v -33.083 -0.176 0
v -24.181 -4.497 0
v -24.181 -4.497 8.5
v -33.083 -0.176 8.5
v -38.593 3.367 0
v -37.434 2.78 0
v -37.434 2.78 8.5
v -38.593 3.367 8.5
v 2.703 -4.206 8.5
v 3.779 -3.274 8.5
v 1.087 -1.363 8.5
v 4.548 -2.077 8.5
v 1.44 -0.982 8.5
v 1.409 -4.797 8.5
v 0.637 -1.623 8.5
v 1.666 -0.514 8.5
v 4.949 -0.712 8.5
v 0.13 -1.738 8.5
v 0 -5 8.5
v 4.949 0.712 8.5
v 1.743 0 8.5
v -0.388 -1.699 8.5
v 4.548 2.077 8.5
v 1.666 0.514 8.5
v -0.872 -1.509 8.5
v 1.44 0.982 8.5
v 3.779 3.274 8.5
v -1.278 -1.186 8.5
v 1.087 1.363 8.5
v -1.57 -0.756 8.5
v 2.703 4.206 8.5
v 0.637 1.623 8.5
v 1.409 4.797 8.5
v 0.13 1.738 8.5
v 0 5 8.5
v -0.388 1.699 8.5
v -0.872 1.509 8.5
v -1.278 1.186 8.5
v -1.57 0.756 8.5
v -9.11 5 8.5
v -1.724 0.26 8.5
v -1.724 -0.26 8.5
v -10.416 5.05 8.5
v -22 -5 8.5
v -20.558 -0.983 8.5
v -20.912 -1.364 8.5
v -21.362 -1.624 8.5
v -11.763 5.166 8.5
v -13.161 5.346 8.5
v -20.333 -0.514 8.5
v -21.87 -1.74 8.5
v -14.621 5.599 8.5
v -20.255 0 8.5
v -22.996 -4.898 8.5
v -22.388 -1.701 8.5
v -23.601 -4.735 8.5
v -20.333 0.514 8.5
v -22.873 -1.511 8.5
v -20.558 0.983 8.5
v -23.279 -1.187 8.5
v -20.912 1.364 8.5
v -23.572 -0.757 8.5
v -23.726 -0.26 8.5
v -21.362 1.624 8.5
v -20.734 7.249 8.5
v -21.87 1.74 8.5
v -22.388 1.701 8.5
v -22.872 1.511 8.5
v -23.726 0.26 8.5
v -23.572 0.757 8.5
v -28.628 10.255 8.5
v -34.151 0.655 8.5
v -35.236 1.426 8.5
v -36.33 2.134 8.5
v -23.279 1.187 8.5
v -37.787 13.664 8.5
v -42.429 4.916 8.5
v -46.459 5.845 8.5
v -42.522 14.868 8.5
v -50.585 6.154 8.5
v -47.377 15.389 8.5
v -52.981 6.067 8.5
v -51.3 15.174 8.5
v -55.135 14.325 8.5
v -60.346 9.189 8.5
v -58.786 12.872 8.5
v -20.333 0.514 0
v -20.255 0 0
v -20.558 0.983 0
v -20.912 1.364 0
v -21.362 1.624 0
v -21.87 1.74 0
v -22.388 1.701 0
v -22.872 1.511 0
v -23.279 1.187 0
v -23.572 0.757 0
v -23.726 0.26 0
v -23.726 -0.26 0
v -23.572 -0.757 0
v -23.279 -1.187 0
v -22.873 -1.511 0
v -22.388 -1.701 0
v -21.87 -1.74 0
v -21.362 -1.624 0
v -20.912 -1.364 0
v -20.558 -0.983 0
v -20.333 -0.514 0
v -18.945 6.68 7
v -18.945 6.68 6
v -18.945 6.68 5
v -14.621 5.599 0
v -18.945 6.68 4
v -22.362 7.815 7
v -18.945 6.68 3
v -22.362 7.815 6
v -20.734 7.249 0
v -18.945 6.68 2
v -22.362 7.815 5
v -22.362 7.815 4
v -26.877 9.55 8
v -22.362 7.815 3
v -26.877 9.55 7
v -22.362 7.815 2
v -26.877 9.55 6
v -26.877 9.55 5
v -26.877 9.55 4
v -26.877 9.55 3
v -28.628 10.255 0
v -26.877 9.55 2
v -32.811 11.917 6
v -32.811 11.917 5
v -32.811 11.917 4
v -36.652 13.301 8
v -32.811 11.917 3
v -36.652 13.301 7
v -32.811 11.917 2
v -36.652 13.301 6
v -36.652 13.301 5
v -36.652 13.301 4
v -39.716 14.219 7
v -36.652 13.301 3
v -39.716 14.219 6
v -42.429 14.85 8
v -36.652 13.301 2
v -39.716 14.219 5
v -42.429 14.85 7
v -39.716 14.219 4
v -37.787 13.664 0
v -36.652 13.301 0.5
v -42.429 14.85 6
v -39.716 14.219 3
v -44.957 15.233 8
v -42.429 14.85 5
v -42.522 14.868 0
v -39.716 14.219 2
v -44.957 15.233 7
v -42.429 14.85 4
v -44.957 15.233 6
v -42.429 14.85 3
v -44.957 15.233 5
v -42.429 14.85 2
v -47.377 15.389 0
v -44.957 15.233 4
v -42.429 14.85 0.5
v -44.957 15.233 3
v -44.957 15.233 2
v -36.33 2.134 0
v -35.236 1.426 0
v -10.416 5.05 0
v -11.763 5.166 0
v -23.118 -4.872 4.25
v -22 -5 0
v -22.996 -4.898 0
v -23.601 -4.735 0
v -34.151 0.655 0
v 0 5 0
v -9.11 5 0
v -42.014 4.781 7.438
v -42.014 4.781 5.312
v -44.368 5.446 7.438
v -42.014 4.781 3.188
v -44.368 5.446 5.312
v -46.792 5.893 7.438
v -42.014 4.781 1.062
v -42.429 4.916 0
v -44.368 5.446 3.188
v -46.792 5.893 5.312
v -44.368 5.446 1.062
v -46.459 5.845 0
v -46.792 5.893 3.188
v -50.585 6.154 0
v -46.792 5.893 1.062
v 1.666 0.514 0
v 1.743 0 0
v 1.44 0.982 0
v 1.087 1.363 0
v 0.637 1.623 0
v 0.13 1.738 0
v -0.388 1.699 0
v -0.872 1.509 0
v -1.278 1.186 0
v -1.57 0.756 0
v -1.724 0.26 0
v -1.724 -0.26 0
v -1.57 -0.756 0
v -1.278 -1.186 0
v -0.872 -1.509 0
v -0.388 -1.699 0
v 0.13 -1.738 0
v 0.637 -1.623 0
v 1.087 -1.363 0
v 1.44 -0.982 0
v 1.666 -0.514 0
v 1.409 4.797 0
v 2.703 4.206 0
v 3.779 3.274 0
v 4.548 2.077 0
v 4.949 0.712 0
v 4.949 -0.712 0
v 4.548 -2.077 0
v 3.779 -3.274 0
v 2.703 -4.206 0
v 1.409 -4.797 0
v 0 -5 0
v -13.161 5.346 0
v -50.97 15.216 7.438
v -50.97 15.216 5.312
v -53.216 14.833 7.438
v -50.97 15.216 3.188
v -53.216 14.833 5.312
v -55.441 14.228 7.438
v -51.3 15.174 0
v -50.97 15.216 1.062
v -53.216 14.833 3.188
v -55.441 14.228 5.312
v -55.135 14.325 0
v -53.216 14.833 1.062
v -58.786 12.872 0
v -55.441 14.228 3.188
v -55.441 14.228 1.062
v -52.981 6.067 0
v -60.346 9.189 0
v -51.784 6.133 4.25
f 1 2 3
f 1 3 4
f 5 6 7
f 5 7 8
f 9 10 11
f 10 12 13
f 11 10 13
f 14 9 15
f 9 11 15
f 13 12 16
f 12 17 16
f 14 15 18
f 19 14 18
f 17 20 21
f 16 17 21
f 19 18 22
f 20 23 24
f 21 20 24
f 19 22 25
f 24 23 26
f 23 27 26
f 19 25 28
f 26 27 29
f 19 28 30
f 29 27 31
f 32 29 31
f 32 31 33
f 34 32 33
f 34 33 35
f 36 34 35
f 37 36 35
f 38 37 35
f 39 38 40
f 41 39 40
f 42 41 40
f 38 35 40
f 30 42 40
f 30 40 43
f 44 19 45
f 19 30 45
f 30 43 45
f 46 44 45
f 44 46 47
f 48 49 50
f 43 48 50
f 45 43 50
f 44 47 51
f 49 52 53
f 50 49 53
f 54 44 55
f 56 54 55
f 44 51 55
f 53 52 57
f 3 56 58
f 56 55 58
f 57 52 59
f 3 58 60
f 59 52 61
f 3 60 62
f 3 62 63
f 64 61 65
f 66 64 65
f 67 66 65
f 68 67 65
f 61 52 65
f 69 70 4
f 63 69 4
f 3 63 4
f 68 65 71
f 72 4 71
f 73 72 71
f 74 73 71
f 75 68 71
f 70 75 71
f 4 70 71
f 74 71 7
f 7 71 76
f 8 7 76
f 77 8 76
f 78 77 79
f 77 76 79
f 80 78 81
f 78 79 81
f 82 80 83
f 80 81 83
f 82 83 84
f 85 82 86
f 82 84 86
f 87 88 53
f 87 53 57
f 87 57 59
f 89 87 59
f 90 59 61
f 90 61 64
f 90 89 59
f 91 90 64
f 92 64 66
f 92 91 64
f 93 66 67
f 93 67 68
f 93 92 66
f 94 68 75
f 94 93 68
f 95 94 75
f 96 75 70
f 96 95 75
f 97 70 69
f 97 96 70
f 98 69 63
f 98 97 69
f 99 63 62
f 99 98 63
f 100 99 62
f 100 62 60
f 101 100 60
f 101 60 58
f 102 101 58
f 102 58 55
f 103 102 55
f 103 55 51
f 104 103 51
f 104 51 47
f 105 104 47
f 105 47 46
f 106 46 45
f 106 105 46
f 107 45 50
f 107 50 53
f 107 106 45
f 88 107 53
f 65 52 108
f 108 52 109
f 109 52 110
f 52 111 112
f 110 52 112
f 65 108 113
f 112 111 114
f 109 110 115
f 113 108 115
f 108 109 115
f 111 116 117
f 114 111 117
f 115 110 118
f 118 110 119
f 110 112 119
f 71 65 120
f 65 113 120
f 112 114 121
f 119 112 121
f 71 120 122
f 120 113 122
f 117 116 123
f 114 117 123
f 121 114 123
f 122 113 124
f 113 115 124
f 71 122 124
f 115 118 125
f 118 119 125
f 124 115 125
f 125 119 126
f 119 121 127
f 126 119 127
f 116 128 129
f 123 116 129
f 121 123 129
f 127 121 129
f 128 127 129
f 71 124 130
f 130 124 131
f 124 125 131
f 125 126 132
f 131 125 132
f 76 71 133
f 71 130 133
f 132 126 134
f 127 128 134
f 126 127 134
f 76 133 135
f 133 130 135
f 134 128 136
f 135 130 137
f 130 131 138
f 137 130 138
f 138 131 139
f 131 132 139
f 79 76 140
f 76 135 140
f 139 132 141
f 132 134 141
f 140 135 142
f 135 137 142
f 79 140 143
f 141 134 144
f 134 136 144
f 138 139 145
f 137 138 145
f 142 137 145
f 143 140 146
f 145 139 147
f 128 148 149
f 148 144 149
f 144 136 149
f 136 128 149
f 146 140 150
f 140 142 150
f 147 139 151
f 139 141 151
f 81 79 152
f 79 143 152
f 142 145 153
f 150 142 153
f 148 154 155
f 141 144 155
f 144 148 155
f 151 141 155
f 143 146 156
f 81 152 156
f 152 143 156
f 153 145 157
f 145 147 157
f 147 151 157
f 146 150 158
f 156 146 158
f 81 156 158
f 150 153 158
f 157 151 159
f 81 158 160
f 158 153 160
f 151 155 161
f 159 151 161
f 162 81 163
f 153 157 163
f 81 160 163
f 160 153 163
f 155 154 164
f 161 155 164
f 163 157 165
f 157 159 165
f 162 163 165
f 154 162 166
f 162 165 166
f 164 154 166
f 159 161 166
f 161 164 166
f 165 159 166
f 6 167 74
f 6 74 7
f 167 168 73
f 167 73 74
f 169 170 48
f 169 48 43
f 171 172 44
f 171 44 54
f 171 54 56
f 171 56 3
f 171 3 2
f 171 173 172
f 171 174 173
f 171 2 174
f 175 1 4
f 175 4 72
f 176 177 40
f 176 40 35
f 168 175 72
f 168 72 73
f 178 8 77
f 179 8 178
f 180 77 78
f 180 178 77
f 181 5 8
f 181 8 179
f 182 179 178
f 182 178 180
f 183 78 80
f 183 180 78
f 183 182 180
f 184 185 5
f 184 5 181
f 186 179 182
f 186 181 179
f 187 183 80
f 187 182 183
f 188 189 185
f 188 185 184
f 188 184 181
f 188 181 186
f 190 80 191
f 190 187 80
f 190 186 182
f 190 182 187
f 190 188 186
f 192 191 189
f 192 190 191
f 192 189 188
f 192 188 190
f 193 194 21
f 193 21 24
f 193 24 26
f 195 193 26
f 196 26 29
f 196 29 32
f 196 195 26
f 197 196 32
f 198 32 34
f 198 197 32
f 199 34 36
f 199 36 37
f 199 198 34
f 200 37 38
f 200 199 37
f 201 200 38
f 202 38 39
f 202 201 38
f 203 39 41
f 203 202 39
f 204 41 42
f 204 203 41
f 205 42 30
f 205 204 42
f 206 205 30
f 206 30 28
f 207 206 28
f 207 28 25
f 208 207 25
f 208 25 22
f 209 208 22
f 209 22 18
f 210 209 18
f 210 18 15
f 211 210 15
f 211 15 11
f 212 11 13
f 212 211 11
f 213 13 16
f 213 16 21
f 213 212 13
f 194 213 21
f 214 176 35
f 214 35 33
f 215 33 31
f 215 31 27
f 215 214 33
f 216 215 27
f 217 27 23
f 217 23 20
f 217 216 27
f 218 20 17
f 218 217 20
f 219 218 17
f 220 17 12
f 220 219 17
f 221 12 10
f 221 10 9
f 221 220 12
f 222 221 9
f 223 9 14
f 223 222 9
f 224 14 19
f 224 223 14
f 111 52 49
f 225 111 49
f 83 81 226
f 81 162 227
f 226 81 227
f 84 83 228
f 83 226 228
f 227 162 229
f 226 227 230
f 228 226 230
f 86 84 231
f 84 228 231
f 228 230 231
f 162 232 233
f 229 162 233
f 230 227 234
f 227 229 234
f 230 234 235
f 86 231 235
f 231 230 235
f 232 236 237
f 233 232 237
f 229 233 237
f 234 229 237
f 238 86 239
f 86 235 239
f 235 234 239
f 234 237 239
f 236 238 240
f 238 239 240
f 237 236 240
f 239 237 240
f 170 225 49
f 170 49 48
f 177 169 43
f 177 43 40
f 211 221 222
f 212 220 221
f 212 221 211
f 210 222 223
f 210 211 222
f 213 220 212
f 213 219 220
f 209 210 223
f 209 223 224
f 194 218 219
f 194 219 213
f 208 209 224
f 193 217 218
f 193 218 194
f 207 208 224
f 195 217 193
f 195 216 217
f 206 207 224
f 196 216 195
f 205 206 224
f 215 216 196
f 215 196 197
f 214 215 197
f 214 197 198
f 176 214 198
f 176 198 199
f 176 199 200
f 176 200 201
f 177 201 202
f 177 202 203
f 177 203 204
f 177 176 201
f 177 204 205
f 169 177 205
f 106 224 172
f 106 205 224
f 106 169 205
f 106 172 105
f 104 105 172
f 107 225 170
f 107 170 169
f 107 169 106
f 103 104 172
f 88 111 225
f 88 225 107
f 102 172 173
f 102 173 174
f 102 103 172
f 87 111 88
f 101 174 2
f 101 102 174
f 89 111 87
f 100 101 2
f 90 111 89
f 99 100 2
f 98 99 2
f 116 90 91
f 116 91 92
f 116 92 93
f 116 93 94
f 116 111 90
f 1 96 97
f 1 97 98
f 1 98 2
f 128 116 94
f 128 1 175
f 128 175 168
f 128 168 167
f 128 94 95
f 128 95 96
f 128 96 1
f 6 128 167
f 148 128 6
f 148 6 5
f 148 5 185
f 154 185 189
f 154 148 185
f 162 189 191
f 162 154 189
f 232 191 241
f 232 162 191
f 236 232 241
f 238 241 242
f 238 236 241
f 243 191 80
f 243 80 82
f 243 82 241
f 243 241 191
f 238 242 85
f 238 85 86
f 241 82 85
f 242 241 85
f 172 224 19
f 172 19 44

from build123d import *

# Parameters (mm, degrees)
CROQUIS1_R              = 1.743
CROQUIS1_R_2            = 1.745
SALIENTE_EXTRUIR1_DEPTH = 8.5


with BuildPart() as part:
    # Croquis1 → Saliente-Extruir1 (new body)
    with BuildSketch(Plane.XY):
        with BuildLine():
            Line((-8.694, 5), (0, 5))
            ThreePointArc((0, 5), (5, 0), (0, -5))
            Line((0, -5), (-22, -5))
            add(Edge.make_bspline(
                [(-22, -5), (-22.376114087, -5.000730995), (-23.127936381, -4.912027071), (-23.842743751, -4.662668406), (-24.18108985, -4.497)],
                knots=[0, 0, 0, 0, 0.499595813, 1, 1, 1, 1], degree=3))
            Line((-24.18108985, -4.497), (-33.082774185, -0.176))
            Line((-33.082774185, -0.176), (-34.150774185, 0.655))
            Line((-34.150774185, 0.655), (-35.235774185, 1.426))
            Line((-35.235774185, 1.426), (-36.329774185, 2.134))
            Line((-36.329774185, 2.134), (-37.433774185, 2.78))
            Line((-37.433774185, 2.78), (-38.592774185, 3.367))
            add(Edge.make_bspline(
                [(-38.592774185, 3.367), (-39.332541124, 3.73458873), (-40.463584029, 4.233674803), (-42.009779682, 4.789621338), (-43.18029785, 5.1503195), (-44.367367964, 5.455509833), (-45.571550782, 5.707001476), (-46.794958977, 5.902822636), (-48.465017773, 6.09379478), (-49.733307298, 6.151003132), (-50.584774185, 6.154)],
                knots=[0, 0, 0, 0, 0.199499465, 0.298230174, 0.396705181, 0.49521602, 0.594152289, 0.693710503, 0.79435234, 1, 1, 1, 1], degree=3))
            add(Edge.make_bspline(
                [(-50.584774185, 6.154), (-51.784512946, 6.156123129), (-52.980774185, 6.067)],
                knots=[0, 0, 0, 1, 1, 1], degree=2))
            Line((-52.980774185, 6.067), (-60.345774185, 9.189))
            Line((-60.345774185, 9.189), (-58.785774185, 12.872))
            add(Edge.make_bspline(
                [(-47.376936723, 15.389), (-48.196892042, 15.403291142), (-49.398277121, 15.379717661), (-50.970775635, 15.224558885), (-52.098811061, 15.061295448), (-53.219989961, 14.84128524), (-54.336112455, 14.567008142), (-55.4494326, 14.235014339), (-56.95056509, 13.707761437), (-58.056017514, 13.22696924), (-58.785774185, 12.872)],
                knots=[0, 0, 0, 0, 0.208580678, 0.30512865, 0.401665607, 0.498317749, 0.595560953, 0.693826211, 0.793634588, 1, 1, 1, 1], degree=3))
            add(Edge.make_bspline(
                [(-14.621, 5.599), (-15.563222131, 5.781119084), (-17.011007703, 6.120848832), (-18.989445264, 6.684731463), (-20.635507849, 7.208092626), (-22.439927245, 7.83467175), (-24.540120329, 8.619913648), (-27.091397312, 9.631396334), (-29.90077475, 10.772491334), (-32.584990491, 11.839895748), (-34.794603661, 12.665403671), (-36.602182307, 13.292835375), (-38.193000796, 13.796531357), (-39.671884667, 14.211722291), (-41.068328907, 14.576337495), (-42.402463198, 14.85165039), (-43.69443221, 15.078308418), (-45.342048595, 15.292337563), (-46.568508645, 15.371828774), (-47.376936723, 15.389)],
                knots=[0, 0, 0, 0, 0.083834458, 0.129855591, 0.179713331, 0.234726598, 0.296726991, 0.375600314, 0.474504455, 0.561662864, 0.627975282, 0.680575135, 0.728822097, 0.773739203, 0.814774439, 0.854888969, 0.892720603, 0.929358167, 1, 1, 1, 1], degree=3))
            Line((-14.621, 5.599), (-13.161, 5.346))
            Line((-13.161, 5.346), (-11.763, 5.166))
            Line((-11.763, 5.166), (-10.416, 5.05))
            Line((-10.416, 5.05), (-9.11, 5))
            Line((-9.11, 5), (-8.694, 5))
        make_face()
        Circle(CROQUIS1_R, mode=Mode.SUBTRACT)
        with Locations((-22, 0)):
            Circle(CROQUIS1_R_2, mode=Mode.SUBTRACT)
    extrude(amount=SALIENTE_EXTRUIR1_DEPTH)


solid = part.part
